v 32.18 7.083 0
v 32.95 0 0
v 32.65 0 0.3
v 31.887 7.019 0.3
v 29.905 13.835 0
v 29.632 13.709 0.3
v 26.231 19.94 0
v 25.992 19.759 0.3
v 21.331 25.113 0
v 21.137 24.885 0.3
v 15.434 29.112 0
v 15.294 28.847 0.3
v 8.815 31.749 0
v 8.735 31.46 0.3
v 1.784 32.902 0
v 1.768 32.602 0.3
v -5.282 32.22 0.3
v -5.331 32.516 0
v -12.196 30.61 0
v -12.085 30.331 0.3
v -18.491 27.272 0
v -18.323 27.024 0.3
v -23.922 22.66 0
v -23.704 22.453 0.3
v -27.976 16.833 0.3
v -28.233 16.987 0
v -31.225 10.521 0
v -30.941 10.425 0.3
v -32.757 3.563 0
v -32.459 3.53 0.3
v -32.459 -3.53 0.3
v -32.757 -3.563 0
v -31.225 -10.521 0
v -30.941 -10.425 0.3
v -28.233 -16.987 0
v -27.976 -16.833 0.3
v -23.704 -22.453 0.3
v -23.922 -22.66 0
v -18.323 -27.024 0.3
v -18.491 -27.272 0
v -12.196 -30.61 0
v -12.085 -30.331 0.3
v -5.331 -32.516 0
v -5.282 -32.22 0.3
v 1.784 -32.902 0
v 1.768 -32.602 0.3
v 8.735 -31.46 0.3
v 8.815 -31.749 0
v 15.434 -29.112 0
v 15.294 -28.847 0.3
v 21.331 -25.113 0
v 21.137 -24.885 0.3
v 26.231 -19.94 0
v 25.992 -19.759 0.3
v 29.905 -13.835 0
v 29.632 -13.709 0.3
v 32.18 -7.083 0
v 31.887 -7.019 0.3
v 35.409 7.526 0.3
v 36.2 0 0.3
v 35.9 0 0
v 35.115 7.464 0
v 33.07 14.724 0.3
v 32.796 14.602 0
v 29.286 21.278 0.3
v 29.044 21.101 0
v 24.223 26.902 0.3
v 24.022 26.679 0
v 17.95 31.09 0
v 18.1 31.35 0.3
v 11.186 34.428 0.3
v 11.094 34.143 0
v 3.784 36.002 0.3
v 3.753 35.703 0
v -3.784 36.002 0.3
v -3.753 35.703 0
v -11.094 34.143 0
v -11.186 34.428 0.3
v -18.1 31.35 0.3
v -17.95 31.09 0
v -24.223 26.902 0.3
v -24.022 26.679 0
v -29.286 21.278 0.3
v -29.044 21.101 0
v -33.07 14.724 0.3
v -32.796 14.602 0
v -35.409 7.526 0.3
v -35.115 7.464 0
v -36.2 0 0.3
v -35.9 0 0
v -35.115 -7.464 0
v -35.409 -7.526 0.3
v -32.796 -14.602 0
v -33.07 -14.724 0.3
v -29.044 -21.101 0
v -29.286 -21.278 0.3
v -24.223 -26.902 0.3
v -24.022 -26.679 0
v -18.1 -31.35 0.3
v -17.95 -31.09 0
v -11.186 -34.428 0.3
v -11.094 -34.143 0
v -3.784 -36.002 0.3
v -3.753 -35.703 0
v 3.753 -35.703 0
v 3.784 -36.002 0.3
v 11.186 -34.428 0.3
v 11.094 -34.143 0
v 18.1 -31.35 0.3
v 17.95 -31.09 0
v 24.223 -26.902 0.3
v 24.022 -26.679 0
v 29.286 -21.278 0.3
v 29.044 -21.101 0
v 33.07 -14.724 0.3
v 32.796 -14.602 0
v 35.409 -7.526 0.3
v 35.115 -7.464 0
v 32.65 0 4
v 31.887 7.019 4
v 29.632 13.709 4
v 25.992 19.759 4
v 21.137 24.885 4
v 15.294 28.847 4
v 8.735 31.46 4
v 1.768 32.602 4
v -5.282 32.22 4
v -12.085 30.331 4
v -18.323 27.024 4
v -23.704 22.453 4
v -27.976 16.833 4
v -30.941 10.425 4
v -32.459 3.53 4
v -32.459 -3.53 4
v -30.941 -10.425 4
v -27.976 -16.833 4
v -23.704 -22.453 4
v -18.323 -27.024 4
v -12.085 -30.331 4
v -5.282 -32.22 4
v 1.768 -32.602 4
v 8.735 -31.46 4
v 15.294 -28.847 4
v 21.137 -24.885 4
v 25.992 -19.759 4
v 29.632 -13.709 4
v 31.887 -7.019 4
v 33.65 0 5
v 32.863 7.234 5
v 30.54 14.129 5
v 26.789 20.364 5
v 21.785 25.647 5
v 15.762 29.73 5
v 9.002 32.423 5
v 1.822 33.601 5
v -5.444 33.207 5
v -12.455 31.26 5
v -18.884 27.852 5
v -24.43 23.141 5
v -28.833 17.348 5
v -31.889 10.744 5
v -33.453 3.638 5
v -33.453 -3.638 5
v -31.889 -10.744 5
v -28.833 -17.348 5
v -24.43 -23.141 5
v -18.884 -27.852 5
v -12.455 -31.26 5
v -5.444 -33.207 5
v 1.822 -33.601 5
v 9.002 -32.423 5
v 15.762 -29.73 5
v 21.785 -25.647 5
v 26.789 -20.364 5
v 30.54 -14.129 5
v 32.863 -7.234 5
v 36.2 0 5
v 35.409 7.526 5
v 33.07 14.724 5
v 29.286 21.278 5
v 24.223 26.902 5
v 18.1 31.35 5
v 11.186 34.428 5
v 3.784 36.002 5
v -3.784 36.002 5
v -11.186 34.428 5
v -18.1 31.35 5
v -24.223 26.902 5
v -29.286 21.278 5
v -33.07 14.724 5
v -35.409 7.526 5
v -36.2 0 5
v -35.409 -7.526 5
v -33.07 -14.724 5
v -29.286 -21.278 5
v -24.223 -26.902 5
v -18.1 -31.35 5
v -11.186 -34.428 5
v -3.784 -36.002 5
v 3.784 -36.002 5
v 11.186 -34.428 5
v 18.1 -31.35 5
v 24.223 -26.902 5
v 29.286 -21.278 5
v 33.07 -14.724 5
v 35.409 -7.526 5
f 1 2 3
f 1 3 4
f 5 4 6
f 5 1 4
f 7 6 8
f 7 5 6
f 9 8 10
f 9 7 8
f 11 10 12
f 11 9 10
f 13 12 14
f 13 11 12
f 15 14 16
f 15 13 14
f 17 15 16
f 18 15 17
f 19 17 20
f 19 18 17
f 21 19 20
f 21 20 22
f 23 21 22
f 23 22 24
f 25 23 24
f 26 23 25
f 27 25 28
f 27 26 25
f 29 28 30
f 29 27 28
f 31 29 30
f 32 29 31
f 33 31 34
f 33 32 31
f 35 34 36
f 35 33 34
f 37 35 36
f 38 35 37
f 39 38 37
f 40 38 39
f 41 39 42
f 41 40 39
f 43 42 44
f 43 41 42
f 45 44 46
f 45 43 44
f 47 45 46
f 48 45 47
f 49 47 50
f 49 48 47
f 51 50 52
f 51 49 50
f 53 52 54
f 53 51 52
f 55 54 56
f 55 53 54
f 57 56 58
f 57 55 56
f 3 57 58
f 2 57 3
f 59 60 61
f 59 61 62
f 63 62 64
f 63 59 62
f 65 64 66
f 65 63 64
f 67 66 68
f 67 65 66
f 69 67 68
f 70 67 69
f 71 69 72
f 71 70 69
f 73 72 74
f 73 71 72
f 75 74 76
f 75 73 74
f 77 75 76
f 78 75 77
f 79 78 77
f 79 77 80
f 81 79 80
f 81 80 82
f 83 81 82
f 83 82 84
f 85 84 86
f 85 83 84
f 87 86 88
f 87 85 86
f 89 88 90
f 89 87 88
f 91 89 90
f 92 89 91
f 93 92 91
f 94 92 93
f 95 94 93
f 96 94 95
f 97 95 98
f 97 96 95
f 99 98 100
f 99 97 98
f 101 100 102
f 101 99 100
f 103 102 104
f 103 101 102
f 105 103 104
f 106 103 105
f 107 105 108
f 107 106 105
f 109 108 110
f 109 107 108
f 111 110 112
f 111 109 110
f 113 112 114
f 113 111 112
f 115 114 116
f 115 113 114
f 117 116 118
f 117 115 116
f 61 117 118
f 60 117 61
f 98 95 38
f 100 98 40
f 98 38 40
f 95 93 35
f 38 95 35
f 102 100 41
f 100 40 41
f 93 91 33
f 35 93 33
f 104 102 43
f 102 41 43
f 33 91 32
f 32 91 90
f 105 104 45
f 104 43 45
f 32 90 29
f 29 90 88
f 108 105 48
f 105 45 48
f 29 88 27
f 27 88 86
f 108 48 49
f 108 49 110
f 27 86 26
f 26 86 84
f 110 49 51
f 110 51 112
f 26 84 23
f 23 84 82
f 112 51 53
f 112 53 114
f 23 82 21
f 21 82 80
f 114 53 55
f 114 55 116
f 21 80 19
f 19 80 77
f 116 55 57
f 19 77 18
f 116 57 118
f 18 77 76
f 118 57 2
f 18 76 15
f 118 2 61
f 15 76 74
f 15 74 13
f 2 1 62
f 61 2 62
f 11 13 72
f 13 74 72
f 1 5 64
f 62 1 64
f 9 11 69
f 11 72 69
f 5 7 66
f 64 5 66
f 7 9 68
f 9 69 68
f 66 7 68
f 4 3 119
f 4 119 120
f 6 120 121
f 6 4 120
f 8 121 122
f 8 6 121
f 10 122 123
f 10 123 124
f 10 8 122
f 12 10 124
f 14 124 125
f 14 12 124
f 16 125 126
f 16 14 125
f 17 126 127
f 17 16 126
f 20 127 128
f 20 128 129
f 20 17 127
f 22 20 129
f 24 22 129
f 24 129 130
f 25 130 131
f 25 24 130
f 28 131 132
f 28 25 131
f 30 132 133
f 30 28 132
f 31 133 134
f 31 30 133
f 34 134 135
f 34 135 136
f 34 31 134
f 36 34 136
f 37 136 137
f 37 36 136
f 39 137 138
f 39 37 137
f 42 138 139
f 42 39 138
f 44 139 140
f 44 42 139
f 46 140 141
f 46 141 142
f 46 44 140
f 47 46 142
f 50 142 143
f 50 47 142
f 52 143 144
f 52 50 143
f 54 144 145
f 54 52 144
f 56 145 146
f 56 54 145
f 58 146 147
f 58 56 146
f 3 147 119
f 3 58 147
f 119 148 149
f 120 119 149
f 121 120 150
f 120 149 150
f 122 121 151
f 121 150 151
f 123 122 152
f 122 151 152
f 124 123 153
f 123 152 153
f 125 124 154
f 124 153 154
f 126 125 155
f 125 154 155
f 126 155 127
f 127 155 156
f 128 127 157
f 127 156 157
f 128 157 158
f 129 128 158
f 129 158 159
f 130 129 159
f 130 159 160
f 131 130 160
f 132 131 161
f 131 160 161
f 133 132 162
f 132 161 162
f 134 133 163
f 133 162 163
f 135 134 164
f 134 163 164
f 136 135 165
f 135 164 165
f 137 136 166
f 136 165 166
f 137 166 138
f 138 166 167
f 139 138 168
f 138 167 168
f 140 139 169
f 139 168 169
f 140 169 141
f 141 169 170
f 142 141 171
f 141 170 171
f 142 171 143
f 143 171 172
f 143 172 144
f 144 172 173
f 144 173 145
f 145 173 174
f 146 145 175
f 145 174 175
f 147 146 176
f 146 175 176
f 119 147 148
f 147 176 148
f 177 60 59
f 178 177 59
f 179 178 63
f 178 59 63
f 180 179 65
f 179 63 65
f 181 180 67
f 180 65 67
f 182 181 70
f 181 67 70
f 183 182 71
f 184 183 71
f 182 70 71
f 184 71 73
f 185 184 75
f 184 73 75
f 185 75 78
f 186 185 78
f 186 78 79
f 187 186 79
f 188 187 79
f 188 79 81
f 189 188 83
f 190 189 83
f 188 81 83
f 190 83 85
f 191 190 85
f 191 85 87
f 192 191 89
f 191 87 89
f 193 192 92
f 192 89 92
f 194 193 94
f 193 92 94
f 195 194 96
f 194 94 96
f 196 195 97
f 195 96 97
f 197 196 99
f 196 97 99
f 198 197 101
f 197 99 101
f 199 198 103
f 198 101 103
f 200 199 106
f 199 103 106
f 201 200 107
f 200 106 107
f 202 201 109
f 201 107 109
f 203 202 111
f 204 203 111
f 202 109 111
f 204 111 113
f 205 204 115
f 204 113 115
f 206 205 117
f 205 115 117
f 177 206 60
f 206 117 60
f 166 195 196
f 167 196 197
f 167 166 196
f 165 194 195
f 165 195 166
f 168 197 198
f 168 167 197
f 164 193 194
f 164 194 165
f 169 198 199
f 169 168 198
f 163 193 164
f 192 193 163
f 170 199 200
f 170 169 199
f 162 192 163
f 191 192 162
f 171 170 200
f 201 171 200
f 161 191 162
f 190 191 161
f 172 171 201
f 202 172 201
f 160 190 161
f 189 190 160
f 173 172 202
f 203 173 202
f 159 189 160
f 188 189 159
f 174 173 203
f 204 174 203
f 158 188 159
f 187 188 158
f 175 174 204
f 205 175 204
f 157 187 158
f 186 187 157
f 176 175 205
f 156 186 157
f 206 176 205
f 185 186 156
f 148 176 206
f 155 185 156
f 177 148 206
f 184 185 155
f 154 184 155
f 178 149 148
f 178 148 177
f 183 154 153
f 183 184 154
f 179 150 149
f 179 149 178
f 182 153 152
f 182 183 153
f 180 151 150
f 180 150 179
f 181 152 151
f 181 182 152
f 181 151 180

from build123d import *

# Parameters (mm, degrees)
SKETCH_R        = 36.2
SKETCH_R_2      = 32.65
PAD_DEPTH       = 5
CHAMFER_SIZE    = 1
CHAMFER001_SIZE = 0.3


with BuildPart() as part:
    # Sketch → Pad (new body)
    with BuildSketch(Plane.XY):
        Circle(SKETCH_R)
        Circle(SKETCH_R_2, mode=Mode.SUBTRACT)
    extrude(amount=PAD_DEPTH)

    # Chamfer
    chamfer_edges = [part.edges().sort_by_distance(p)[0] for p in [
        (-32.65, 0, 5),
    ]]
    chamfer(chamfer_edges, length=CHAMFER_SIZE)

    # Chamfer001
    chamfer001_edges = [part.edges().sort_by_distance(p)[0] for p in [
        (-36.2, 0, 0),
        (-32.65, 0, 0),
    ]]
    chamfer(chamfer001_edges, length=CHAMFER001_SIZE)


solid = part.part
